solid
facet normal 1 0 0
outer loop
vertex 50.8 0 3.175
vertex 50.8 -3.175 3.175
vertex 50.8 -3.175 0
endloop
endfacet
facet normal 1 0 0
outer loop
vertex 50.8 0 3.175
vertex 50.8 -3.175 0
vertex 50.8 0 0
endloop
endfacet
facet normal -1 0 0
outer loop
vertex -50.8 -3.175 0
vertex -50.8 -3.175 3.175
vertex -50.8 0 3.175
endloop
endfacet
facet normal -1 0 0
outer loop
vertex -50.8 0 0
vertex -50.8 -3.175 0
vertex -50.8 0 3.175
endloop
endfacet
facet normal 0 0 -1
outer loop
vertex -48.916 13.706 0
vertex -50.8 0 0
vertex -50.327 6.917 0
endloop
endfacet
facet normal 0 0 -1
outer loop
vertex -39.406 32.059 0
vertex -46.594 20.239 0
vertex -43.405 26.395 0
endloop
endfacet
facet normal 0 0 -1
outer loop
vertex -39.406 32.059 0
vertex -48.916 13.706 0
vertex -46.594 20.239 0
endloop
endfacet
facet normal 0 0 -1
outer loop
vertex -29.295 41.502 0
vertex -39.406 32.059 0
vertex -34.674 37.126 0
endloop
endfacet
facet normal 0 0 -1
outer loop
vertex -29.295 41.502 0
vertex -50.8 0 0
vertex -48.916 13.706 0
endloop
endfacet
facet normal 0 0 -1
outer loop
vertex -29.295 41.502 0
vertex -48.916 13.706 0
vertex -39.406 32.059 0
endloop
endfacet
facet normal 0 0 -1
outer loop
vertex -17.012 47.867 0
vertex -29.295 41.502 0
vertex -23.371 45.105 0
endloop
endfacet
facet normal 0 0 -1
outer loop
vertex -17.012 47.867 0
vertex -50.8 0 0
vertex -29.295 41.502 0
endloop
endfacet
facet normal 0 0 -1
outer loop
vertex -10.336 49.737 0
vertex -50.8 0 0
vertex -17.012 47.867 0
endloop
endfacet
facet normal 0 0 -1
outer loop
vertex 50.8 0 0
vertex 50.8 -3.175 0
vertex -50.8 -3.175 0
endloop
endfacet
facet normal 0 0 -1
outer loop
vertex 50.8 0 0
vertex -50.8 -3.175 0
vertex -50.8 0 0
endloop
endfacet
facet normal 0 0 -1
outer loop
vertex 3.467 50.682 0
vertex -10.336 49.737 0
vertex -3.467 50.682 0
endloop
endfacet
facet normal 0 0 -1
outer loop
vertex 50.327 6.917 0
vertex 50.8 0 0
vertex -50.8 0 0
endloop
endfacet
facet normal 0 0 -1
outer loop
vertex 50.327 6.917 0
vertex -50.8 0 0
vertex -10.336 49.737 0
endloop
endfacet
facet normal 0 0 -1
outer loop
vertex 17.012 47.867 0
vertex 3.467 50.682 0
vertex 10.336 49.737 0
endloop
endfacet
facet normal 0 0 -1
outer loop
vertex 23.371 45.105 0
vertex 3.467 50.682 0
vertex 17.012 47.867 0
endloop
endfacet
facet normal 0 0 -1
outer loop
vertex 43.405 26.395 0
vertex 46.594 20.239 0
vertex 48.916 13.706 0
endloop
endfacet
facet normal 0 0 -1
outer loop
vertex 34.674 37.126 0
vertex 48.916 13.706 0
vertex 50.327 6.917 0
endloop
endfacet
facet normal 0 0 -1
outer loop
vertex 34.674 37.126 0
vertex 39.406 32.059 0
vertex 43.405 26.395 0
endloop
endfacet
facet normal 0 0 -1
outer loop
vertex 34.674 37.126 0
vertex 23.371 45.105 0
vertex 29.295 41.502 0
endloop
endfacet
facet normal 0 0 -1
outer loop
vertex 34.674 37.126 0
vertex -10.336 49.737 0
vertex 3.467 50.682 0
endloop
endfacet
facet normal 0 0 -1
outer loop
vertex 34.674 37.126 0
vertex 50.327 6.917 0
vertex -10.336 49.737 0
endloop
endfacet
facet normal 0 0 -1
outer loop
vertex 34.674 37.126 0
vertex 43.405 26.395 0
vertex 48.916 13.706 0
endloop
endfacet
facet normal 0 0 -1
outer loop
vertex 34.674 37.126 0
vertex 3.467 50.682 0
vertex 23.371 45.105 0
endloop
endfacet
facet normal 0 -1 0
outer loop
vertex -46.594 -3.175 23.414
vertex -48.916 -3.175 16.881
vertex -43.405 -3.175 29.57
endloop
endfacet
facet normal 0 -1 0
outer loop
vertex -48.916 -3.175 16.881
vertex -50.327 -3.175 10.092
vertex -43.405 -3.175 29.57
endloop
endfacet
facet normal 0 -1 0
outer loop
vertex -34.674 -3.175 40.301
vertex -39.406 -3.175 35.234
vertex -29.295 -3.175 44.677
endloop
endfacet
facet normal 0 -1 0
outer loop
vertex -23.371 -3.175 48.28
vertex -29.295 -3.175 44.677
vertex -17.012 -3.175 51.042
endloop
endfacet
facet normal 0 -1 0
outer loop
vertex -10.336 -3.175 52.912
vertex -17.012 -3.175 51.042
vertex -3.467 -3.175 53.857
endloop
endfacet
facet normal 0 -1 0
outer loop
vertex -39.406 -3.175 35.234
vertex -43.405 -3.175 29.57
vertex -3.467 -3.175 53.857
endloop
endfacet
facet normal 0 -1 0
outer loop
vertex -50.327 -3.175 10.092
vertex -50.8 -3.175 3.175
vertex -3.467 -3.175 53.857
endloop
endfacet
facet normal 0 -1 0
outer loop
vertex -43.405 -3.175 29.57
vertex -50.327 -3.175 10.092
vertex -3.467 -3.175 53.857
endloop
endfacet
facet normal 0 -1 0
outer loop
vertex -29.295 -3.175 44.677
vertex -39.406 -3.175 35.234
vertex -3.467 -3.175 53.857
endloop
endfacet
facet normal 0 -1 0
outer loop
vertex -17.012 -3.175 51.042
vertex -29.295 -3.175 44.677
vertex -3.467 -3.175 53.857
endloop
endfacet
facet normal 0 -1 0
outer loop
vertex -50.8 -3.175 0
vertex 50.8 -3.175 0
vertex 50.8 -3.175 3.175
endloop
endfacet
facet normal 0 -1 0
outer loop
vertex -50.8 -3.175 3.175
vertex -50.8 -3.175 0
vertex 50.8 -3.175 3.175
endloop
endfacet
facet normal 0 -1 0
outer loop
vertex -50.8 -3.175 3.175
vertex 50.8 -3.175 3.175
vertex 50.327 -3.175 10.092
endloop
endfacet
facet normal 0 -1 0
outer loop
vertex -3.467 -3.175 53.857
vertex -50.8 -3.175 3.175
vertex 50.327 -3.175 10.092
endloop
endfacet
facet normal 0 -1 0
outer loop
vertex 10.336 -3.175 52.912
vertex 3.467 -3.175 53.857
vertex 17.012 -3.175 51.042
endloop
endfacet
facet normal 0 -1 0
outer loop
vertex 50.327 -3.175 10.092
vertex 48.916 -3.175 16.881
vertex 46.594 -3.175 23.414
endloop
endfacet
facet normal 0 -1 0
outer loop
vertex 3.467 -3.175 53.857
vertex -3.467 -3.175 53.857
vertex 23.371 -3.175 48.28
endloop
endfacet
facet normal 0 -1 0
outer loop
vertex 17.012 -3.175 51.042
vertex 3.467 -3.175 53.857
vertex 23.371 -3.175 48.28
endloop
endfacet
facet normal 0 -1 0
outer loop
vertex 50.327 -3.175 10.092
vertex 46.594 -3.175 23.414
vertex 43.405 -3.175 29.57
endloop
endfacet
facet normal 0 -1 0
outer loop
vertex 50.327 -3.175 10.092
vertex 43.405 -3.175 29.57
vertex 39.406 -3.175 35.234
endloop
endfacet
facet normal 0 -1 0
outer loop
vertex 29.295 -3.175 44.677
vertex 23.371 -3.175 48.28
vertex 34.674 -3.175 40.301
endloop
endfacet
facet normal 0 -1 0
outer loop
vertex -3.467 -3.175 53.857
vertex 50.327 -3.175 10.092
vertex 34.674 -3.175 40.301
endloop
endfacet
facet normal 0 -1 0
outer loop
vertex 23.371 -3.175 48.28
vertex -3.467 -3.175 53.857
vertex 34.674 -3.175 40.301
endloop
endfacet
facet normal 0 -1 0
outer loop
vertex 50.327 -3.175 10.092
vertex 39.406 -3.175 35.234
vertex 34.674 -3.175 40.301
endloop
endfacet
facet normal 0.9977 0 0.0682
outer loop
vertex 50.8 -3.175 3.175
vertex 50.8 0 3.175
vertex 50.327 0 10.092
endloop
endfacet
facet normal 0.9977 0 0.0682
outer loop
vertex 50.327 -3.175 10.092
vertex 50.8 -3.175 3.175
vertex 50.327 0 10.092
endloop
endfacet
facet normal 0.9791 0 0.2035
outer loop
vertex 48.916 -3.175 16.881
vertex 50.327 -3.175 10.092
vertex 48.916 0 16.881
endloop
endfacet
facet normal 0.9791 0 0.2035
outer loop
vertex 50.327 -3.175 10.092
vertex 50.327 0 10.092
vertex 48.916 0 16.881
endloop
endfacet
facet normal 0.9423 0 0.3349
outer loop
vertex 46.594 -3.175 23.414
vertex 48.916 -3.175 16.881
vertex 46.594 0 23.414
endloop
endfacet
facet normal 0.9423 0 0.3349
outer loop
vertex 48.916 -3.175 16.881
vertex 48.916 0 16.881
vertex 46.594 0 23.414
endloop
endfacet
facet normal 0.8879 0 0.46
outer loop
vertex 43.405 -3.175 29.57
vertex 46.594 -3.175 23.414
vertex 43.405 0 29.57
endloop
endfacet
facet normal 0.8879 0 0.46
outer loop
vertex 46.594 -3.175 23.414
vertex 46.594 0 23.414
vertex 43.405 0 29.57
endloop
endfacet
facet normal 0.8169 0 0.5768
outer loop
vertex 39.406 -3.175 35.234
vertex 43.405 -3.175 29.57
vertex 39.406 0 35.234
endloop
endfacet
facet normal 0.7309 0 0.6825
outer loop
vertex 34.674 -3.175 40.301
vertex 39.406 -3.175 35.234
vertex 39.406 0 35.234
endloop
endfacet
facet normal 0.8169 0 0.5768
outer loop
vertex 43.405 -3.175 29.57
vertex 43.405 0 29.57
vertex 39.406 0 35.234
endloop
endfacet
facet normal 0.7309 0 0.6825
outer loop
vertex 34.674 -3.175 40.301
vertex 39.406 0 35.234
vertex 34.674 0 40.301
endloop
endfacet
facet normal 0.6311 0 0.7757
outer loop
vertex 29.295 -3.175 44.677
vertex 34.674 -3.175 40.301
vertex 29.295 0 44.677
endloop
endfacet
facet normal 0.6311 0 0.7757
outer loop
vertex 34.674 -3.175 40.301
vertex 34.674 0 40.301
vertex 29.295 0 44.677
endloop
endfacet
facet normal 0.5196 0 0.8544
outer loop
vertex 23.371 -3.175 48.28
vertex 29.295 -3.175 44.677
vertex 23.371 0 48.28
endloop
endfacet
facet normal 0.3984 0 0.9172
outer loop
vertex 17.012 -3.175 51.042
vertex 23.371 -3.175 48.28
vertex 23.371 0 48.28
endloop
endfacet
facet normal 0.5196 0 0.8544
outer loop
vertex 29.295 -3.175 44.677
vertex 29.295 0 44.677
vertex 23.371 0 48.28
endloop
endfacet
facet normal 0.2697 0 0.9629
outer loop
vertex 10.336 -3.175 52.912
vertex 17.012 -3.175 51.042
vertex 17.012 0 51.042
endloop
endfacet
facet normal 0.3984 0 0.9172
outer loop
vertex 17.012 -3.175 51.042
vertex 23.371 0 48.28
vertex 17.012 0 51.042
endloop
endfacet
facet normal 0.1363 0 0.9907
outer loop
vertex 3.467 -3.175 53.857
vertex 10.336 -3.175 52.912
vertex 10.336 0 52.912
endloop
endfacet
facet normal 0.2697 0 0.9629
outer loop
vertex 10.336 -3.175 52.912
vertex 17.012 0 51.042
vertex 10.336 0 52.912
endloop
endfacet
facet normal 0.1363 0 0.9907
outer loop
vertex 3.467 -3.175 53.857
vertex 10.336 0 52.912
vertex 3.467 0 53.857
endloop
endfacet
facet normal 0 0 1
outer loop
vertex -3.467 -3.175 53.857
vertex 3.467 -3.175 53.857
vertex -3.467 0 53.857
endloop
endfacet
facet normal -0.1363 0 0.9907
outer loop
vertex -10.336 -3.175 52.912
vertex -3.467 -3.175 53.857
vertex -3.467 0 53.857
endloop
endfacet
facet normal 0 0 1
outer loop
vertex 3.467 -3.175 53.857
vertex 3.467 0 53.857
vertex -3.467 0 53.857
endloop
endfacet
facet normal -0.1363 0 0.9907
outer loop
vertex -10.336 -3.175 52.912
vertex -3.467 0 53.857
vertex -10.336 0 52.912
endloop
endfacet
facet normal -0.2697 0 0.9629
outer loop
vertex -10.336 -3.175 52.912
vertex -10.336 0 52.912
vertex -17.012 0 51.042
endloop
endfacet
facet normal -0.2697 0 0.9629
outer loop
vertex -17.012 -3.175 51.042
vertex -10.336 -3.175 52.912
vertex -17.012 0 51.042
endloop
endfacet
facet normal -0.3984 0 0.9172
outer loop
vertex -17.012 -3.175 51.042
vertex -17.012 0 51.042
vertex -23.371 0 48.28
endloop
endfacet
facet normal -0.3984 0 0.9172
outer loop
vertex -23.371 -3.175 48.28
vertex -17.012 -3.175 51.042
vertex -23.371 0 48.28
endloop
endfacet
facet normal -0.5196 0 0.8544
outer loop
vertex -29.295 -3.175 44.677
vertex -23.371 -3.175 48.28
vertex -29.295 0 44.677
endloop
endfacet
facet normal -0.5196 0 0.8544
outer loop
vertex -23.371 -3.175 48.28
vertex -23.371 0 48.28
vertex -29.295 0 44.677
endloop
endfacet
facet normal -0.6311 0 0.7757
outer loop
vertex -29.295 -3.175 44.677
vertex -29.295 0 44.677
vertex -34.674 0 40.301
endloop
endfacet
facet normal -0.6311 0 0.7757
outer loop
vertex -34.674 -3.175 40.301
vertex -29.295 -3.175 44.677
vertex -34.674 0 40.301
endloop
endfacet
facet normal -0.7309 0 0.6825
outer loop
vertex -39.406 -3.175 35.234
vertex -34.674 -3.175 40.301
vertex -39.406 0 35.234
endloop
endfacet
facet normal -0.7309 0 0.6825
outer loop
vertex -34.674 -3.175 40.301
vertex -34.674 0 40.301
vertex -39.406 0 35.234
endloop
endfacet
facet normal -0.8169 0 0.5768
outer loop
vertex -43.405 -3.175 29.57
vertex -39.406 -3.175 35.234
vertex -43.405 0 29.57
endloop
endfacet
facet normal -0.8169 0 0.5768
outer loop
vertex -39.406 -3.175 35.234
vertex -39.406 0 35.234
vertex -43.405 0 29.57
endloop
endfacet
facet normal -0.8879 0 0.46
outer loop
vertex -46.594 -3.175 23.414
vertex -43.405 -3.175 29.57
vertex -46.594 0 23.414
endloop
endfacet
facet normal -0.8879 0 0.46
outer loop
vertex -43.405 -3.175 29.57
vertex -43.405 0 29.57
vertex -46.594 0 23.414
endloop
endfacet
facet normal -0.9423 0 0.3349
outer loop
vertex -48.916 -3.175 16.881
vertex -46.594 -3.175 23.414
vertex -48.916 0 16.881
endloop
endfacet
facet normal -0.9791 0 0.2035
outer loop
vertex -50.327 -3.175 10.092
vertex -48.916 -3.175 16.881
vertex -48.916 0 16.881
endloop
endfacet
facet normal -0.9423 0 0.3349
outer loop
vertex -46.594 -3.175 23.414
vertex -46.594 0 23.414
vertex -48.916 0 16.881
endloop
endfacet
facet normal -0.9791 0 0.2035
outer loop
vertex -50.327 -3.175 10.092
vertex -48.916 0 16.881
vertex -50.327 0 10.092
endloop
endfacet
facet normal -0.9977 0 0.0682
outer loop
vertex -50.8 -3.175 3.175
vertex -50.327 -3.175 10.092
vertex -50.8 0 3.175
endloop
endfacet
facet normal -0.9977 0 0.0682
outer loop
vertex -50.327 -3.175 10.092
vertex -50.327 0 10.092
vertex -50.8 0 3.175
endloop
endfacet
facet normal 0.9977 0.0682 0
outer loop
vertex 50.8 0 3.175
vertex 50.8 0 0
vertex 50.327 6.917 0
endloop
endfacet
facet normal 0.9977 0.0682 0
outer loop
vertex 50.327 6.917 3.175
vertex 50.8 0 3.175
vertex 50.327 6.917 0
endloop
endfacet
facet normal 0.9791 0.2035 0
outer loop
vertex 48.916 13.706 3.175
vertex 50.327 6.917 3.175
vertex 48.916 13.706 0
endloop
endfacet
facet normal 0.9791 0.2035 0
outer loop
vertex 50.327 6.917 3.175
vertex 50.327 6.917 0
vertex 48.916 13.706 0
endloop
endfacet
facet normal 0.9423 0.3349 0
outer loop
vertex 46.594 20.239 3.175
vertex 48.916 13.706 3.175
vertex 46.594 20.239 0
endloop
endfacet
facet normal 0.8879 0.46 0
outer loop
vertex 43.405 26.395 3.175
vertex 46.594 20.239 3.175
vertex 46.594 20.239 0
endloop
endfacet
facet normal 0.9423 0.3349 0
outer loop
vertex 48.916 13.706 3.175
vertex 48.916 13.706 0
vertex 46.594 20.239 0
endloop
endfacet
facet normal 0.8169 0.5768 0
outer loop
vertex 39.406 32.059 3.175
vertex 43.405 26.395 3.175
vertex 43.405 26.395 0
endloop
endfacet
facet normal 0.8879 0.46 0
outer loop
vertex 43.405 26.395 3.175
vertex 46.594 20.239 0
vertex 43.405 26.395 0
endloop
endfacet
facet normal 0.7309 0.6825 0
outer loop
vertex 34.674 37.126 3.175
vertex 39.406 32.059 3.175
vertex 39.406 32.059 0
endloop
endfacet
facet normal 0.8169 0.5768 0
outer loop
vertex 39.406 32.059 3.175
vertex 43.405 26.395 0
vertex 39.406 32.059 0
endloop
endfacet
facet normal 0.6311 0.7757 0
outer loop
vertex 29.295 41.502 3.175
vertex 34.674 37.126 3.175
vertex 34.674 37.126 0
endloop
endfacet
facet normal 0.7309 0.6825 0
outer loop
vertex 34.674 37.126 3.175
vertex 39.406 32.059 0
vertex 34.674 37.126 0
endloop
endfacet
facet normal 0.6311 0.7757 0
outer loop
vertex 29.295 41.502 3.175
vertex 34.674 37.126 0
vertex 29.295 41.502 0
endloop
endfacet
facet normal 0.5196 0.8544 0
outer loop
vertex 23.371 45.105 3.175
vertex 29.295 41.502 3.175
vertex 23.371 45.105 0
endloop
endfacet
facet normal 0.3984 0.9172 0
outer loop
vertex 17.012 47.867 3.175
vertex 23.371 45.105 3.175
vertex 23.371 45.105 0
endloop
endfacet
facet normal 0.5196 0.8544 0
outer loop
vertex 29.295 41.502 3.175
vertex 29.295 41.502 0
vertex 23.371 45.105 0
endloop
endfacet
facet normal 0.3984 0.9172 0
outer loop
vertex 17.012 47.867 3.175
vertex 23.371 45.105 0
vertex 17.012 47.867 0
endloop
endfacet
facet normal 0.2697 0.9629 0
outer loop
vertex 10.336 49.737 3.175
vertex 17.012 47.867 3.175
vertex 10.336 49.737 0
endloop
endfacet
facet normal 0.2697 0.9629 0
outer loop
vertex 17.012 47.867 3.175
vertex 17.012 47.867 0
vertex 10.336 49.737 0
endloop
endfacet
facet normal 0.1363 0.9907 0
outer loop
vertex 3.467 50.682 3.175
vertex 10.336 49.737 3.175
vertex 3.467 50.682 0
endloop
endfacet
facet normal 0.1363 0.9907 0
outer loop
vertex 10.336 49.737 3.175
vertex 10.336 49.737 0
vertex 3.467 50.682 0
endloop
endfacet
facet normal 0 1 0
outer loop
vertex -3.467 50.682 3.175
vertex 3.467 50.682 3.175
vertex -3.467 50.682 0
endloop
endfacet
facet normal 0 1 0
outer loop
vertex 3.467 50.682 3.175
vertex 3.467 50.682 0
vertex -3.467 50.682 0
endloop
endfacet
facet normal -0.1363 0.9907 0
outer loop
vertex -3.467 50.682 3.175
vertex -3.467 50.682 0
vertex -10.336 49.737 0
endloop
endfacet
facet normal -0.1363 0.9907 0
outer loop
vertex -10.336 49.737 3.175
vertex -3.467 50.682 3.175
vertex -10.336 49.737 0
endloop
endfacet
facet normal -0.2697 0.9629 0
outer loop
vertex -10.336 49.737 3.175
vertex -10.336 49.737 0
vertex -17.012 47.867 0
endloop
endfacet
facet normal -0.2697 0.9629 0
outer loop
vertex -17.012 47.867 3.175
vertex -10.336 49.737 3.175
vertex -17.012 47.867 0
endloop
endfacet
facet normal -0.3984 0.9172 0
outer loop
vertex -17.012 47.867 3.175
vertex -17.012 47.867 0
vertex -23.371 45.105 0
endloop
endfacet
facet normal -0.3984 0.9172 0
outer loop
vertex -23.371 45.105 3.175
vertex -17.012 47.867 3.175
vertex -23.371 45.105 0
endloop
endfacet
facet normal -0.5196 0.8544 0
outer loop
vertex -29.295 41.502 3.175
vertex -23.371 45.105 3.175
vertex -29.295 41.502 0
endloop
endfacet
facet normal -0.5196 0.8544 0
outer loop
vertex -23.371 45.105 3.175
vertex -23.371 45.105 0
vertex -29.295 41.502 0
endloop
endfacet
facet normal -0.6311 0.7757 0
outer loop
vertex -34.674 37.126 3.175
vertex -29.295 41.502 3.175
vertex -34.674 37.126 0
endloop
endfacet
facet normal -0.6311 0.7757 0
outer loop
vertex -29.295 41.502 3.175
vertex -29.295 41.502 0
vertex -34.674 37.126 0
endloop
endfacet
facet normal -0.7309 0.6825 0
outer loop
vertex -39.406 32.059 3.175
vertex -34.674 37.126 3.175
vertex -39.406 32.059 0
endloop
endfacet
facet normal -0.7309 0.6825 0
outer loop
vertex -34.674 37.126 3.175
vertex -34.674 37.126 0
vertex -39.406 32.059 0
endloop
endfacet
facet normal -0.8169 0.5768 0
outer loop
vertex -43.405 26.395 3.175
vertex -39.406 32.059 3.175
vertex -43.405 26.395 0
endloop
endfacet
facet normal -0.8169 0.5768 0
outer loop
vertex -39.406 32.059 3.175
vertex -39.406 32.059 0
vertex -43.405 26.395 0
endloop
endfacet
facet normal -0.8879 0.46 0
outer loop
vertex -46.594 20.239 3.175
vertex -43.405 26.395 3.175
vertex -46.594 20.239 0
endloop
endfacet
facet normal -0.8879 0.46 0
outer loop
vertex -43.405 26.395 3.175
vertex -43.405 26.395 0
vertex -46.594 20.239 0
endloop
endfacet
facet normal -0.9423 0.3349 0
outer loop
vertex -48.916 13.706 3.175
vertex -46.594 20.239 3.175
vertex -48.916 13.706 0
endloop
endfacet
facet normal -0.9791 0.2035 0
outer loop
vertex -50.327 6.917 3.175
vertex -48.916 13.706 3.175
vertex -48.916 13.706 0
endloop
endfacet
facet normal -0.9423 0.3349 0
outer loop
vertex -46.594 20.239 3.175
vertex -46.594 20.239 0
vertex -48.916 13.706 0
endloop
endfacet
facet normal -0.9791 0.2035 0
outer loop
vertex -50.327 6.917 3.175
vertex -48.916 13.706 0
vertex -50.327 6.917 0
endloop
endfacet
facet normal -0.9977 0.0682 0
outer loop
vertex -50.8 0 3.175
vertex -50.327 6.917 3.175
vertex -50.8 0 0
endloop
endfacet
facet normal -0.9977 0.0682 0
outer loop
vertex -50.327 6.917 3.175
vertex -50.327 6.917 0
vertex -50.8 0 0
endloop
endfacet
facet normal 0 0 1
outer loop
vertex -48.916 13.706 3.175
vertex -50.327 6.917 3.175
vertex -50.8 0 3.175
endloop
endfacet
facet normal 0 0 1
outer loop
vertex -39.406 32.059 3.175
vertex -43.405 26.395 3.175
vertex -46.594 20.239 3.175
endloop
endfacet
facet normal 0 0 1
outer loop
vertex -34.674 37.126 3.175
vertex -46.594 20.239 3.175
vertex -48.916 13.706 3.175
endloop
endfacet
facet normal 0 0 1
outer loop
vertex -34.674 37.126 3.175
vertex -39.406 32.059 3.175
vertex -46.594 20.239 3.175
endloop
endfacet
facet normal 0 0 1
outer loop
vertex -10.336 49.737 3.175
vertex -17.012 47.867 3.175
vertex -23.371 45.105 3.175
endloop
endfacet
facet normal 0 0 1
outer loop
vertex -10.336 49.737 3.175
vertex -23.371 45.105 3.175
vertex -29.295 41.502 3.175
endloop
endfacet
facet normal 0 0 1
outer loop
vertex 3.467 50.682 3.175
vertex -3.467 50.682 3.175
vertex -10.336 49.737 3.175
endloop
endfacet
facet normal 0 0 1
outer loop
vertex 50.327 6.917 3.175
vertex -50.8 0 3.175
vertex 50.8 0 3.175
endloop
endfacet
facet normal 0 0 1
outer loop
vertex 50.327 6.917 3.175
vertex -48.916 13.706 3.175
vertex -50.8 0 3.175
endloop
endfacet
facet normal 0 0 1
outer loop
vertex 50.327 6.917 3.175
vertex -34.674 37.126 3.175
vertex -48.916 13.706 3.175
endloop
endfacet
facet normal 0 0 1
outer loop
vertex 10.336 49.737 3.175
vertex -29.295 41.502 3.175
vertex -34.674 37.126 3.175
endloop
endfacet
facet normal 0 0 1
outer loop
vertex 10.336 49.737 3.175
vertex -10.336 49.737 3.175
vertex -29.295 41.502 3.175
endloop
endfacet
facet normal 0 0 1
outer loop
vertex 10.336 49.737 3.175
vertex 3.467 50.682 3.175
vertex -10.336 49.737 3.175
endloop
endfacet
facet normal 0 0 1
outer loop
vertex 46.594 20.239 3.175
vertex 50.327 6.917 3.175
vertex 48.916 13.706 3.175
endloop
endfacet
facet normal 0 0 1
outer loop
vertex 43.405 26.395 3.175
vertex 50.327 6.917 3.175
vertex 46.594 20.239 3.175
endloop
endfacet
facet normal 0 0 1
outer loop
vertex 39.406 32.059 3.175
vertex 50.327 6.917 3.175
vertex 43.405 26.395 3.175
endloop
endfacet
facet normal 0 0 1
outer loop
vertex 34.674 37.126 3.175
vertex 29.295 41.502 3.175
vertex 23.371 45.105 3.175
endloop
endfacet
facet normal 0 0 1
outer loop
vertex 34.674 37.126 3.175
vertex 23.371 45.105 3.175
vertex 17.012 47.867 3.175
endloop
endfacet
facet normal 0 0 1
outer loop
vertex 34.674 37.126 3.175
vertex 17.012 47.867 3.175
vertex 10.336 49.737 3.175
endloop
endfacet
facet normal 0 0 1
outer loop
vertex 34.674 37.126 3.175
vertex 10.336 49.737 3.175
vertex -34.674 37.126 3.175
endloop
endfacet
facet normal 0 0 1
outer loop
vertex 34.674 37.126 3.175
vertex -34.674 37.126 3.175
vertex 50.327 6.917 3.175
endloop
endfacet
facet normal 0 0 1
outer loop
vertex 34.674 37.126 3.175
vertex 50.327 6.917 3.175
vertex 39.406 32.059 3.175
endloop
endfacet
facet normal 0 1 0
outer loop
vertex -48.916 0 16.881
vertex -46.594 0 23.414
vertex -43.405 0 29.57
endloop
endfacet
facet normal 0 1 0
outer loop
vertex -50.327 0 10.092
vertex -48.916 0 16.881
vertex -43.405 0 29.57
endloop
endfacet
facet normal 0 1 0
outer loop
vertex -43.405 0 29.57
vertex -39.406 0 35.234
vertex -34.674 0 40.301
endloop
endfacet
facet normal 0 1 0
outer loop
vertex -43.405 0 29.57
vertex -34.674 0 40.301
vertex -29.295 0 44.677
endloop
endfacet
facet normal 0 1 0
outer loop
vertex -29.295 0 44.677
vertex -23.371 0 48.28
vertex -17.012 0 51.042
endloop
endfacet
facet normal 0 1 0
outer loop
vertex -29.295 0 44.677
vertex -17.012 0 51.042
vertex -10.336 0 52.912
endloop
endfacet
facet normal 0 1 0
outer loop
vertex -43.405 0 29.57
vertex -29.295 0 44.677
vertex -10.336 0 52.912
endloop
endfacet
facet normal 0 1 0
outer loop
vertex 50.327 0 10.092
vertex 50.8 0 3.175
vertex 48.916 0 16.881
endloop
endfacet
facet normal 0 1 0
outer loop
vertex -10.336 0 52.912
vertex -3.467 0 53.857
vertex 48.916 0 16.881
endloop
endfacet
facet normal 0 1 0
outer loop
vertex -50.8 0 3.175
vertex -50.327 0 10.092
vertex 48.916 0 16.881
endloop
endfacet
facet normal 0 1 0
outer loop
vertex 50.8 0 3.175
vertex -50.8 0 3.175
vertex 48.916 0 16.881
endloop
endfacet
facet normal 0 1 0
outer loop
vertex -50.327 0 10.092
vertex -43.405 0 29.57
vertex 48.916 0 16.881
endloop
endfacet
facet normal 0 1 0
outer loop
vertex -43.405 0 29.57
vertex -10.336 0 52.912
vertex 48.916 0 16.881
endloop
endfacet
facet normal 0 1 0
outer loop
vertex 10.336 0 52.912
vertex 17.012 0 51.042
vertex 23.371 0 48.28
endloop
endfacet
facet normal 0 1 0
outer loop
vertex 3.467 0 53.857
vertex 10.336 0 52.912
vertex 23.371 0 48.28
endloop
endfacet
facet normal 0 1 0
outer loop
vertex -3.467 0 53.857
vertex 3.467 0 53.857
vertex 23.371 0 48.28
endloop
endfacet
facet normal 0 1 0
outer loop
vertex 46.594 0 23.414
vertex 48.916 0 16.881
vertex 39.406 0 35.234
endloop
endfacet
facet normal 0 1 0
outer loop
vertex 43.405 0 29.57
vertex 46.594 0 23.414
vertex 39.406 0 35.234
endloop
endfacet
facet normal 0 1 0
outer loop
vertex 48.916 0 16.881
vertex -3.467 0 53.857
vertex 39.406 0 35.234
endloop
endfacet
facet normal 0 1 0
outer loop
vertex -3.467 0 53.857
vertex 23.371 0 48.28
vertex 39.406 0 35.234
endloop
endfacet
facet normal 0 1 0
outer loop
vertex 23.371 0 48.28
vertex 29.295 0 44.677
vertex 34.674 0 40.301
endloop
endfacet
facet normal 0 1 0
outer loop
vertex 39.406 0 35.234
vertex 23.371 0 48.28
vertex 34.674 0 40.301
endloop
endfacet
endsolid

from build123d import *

# Parameters (mm, degrees)
F1_DEPTH      = 3.175
F3_DEPTH      = 3.175
F4_W          = 3.175
F4_H          = 3.175
F5_DEPTH      = 50.8
F5_DEPTH_BACK = 50.8


# Not quite as in the source:
# - an extrude ends at something that could not be found from the text; its depth is read off the source's solid


with BuildPart() as f1:
    # F0 (on Top) → F1 (new body)
    with BuildSketch(Plane.XY):
        with BuildLine():
            Line((-50.8, 0), (50.8, 0))
            ThreePointArc((50.8, 0), (0, 50.8), (-50.8, 0))
        make_face()
    extrude(amount=F1_DEPTH)

    # F2 (on face) → F3 (join)
    with BuildSketch(Plane.XZ):
        with BuildLine():
            ThreePointArc((50.8, 3.175), (0, 53.975), (-50.8, 3.175))
            Line((-50.8, 3.175), (50.8, 3.175))
        make_face()
    extrude(amount=F3_DEPTH)

    # F4 (on Right) → F5 (join, two sides)
    with BuildSketch(Plane.YZ) as f5_sk:
        with Locations((-1.5875, 1.5875)):
            Rectangle(F4_W, F4_H)
    extrude(amount=F5_DEPTH)
    extrude(f5_sk.sketch, amount=-F5_DEPTH_BACK)


solid = f1.part
